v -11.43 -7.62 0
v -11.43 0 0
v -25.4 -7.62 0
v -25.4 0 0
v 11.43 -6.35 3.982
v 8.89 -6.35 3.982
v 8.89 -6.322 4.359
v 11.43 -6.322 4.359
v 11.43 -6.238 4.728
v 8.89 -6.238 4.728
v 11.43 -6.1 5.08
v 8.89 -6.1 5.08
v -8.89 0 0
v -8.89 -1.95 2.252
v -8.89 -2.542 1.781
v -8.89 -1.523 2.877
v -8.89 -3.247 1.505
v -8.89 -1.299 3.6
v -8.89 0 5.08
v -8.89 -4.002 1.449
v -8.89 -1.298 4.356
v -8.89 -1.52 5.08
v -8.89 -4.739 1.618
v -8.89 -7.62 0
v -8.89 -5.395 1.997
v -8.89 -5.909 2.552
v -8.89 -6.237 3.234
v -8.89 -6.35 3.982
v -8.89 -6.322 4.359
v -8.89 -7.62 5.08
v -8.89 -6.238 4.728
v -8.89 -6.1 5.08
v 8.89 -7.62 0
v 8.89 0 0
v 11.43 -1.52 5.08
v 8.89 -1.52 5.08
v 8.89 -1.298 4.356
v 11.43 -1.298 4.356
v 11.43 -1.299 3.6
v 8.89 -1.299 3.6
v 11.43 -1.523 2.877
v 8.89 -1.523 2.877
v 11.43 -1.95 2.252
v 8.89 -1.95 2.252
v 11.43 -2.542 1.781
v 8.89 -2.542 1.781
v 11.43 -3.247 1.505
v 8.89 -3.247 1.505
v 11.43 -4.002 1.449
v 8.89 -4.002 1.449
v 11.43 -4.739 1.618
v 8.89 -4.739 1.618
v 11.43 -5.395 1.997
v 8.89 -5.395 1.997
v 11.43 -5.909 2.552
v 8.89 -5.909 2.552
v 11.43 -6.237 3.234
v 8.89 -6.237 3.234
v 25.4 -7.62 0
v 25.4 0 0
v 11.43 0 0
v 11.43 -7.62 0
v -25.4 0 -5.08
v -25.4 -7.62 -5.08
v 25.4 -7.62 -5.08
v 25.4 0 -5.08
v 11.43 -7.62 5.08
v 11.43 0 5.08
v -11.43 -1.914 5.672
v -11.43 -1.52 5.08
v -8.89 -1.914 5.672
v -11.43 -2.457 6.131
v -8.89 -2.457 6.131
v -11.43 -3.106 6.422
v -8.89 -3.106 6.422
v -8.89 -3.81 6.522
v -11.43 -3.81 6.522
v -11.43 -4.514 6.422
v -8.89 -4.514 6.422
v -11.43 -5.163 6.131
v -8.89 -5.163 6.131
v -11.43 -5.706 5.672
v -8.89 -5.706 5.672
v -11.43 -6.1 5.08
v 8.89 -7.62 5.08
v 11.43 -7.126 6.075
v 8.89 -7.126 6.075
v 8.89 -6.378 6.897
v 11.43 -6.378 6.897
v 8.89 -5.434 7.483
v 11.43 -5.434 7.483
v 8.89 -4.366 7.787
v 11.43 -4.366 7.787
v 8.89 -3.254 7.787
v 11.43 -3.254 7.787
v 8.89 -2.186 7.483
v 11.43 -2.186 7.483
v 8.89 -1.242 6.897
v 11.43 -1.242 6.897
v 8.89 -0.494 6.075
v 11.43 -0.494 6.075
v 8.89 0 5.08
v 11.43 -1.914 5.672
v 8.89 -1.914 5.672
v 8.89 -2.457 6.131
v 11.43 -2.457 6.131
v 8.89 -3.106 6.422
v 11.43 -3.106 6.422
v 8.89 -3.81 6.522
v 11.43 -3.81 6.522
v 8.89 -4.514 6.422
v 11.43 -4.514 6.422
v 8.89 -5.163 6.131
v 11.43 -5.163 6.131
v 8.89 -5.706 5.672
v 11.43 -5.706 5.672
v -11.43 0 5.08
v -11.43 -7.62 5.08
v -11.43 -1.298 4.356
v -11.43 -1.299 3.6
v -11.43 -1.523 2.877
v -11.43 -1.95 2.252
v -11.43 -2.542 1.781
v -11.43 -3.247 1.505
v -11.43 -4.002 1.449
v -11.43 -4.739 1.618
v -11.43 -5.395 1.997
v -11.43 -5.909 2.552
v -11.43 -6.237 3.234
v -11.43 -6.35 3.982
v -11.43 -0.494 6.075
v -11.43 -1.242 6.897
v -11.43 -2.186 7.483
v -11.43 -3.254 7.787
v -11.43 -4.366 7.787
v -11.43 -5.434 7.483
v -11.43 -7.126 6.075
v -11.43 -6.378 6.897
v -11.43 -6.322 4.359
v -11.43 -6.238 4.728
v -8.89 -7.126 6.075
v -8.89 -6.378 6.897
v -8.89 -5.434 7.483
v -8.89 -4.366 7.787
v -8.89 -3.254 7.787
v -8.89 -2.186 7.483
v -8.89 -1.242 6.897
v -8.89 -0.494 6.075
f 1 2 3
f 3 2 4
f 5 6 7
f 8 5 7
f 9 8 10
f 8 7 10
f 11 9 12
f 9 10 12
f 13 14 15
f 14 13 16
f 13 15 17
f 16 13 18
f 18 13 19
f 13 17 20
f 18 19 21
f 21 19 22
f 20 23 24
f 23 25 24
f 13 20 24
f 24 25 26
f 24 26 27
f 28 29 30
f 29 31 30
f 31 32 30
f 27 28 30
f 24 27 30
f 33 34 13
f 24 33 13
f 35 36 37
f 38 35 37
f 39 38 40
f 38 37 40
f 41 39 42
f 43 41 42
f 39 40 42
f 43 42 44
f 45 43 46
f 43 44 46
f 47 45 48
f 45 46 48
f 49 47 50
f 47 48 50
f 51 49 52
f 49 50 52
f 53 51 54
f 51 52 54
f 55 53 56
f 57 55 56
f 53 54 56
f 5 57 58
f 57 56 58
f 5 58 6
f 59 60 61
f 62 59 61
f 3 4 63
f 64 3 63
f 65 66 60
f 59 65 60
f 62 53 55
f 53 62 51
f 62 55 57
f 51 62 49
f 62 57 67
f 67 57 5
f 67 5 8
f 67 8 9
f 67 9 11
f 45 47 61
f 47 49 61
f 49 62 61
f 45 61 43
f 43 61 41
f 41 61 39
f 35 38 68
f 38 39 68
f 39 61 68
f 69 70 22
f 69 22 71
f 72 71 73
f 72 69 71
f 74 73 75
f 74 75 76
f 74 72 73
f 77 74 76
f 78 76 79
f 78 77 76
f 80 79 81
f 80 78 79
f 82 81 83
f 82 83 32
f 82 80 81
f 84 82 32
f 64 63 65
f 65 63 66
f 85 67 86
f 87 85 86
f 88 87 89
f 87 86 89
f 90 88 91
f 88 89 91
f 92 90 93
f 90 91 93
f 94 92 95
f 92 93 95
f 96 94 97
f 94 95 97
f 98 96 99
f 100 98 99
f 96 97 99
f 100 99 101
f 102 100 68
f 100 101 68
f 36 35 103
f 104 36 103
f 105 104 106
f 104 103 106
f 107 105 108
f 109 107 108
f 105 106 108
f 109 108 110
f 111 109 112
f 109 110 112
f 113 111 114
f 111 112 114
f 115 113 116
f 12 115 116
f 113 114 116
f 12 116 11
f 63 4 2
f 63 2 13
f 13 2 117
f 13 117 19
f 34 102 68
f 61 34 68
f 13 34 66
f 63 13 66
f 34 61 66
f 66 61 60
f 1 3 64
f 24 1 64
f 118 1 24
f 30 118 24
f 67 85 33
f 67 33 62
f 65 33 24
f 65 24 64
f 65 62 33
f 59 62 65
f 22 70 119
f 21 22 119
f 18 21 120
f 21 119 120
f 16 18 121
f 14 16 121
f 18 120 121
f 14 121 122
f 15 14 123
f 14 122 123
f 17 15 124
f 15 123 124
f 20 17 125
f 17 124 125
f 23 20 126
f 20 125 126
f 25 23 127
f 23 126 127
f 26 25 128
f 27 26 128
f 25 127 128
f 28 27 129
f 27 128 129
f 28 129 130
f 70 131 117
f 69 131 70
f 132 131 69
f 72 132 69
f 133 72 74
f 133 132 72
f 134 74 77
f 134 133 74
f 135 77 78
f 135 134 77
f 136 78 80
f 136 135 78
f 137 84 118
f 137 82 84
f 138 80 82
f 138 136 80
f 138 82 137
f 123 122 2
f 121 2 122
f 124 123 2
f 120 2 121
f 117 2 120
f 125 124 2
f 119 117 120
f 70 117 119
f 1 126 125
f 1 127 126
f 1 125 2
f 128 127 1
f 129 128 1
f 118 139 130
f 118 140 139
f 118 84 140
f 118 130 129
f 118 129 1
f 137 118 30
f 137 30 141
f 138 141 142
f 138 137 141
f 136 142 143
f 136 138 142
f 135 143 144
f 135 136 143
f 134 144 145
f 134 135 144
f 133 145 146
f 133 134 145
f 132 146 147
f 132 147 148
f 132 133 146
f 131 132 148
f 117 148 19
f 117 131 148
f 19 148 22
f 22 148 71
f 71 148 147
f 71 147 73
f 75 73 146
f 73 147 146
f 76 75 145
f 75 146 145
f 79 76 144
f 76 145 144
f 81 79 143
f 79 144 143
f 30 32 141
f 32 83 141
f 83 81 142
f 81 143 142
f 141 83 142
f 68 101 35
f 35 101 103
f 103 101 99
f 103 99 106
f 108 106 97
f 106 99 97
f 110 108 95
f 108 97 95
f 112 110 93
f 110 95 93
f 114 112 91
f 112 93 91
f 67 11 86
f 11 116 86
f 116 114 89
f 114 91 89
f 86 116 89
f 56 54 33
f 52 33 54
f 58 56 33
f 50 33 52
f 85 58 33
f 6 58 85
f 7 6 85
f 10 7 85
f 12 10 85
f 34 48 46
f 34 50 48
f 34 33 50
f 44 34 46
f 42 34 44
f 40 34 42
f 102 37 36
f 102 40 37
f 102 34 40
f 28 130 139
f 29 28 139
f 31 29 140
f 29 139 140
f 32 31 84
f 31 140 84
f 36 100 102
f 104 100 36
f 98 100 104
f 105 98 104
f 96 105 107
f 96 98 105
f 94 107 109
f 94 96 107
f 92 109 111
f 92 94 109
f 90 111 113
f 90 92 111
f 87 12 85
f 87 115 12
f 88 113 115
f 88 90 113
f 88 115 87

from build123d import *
from build123d import SkipClean  # not in build123d's __all__

# Parameters (mm, degrees)
F1_DEPTH = 7.62
F2_DEPTH = 7.62
F0_W     = 2.54
F0_H     = 5.08
F3_DEPTH = 7.62
F5_DEPTH = 2.54
F6_DEPTH = 36.831


# Not quite as in the source:
# - a feature names something its author has since deleted; it is built from what else it names


with BuildPart() as f1:
    # F0 (on Front) → F1 (new body)
    with BuildSketch(Plane.XZ):
        Polygon((8.89, 0), (0, 0), (-8.89, 0), (-11.43, 0), (-25.4, 0), (-25.4, -5.08), (25.4, -5.08), (25.4, 0), (11.43, 0), align=None)
    extrude(amount=F1_DEPTH)

    # F0 (on Front) → F2 (join)
    with BuildSketch(Plane.XZ):
        Polygon((8.89, 0), (0, 0), (-8.89, 0), (-11.43, 0), (-25.4, 0), (-25.4, -5.08), (25.4, -5.08), (25.4, 0), (11.43, 0), align=None)
    extrude(amount=F2_DEPTH)

    # F0 (on Front) → F3 (join)
    with BuildSketch(Plane.XZ):
        with Locations((-10.16, 2.54)):
            Rectangle(F0_W, F0_H)
        with Locations((10.16, 2.54)):
            Rectangle(F0_W, F0_H)
    extrude(amount=F3_DEPTH)

    # F4 (on face) → F5 (join)
    with BuildSketch(Plane(origin=(-11.43, 0, 0), x_dir=(0, -1, 0), z_dir=(-1, 0, 0))):
        with BuildLine():
            Line((6.1004036929, 5.08), (7.62, 5.08))
            ThreePointArc((7.62, 5.08), (3.81, 7.8260926284), (0, 5.08))
            Line((0, 5.08), (1.5195963071, 5.08))
            ThreePointArc((1.5195963071, 5.08), (3.81, 6.5219786325), (6.1004036929, 5.08))
        make_face()
    extrude(amount=-F5_DEPTH)

    # F4 (on face) → F6 (cut, through all)
    with BuildSketch(Plane(origin=(-11.43, 0, 0), x_dir=(0, -1, 0), z_dir=(-1, 0, 0))):
        with BuildLine():
            ThreePointArc((6.35, 3.9819786325), (6.2868150294, 4.5449948934), (6.1004036929, 5.08))
            Line((6.1004036929, 5.08), (1.5195963071, 5.08))
            ThreePointArc((1.5195963071, 5.08), (3.2469837391, 1.5051636031), (6.35, 3.9819786325))
        make_face()
    with SkipClean():  # cleaning this boolean's faces spoils the solid; the shape is the same uncleaned
        extrude(amount=-F6_DEPTH, mode=Mode.SUBTRACT)

    # F7: F1 across plane


with BuildPart() as f1_1:
    add(f1.part, clean=False)
    with SkipClean():  # cleaning this boolean's faces spoils the solid; the shape is the same uncleaned
        add(f1.part.mirror(Plane.YZ), clean=False)


solid = f1_1.part
